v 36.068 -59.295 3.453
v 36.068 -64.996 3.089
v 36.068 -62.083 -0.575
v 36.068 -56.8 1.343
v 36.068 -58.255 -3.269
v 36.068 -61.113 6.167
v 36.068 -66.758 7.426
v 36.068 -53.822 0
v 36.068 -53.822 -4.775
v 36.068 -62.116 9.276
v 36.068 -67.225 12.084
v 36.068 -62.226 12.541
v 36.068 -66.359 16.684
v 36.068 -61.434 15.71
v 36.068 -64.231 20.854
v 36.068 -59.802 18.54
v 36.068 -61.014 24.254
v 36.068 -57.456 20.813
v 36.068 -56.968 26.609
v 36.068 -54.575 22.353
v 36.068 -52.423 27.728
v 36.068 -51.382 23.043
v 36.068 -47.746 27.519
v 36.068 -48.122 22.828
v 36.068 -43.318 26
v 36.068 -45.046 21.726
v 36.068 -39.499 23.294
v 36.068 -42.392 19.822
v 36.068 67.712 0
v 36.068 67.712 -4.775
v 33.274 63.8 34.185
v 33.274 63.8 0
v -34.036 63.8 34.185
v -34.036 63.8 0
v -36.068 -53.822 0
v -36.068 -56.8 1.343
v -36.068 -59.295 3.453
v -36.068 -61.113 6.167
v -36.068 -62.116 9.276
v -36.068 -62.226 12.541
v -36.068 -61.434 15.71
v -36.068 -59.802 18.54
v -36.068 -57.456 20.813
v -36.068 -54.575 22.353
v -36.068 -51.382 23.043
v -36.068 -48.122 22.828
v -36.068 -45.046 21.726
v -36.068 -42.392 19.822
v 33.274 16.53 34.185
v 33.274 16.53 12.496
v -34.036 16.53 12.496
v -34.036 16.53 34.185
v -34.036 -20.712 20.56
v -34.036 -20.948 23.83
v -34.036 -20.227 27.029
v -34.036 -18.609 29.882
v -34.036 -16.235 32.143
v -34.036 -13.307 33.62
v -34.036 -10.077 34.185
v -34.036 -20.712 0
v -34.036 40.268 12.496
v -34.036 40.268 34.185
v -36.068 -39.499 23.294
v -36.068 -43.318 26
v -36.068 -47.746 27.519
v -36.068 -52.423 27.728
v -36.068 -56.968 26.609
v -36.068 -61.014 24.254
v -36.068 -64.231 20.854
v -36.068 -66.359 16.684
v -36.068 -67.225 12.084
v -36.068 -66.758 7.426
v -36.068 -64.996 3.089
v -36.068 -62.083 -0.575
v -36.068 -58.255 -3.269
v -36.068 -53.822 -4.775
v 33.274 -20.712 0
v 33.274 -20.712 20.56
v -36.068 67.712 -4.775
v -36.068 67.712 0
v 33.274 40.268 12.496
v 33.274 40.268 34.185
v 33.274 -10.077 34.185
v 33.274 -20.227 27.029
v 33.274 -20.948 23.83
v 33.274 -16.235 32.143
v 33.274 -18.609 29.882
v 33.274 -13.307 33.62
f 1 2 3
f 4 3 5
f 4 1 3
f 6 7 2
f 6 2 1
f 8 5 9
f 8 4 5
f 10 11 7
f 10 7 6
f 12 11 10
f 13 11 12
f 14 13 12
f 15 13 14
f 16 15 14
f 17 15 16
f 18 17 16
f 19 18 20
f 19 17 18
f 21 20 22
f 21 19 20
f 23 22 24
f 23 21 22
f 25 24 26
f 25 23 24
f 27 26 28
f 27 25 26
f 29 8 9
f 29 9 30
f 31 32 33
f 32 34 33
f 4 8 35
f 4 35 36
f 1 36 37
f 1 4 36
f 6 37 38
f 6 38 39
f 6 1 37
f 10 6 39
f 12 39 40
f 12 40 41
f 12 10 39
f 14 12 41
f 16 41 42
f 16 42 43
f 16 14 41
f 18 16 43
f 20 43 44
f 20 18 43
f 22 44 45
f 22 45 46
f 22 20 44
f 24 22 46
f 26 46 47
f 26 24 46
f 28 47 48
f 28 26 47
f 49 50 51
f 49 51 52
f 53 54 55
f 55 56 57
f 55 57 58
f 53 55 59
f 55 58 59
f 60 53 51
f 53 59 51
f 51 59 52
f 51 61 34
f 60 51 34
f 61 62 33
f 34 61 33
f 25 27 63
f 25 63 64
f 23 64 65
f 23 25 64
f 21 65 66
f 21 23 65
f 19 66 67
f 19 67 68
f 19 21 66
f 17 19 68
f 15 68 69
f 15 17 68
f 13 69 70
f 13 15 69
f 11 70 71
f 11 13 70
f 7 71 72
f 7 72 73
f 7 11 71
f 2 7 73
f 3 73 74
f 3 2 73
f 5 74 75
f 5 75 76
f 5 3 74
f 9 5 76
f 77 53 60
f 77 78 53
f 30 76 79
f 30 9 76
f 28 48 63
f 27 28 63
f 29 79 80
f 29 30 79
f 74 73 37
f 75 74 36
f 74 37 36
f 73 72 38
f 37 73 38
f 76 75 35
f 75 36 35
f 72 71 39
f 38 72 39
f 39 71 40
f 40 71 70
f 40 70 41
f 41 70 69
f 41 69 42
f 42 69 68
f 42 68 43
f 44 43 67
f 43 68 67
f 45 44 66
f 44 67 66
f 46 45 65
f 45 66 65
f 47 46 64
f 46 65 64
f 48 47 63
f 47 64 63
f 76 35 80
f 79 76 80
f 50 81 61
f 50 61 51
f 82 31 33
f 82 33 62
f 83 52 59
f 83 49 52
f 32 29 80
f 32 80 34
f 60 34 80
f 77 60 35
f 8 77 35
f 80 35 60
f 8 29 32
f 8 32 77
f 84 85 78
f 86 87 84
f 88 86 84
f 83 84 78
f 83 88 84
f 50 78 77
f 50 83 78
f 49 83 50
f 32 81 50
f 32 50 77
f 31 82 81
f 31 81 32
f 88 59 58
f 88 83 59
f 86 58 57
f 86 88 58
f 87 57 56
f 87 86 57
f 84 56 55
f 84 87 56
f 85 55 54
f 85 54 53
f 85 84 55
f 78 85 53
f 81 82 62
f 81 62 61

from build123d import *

# Parameters (mm, degrees)
F1_DEPTH      = 36.068
F1_DEPTH_BACK = 36.068
F3_DEPTH      = 33.274
F3_DEPTH_BACK = 34.036


with BuildPart() as f1:
    # F0 (on Right) → F1 (new body, two sides)
    with BuildSketch(Plane.YZ) as f1_sk:
        with BuildLine():
            Line((67.711897, 0), (53.822275, 0))
            Line((53.822275, 0), (-53.822279, 0))
            ThreePointArc((-53.822279, 0), (-60.71707, 17.182161), (-42.39228, 19.821646))
            Line((-42.39228, 19.821646), (-39.498609, 23.294052))
            ThreePointArc((-39.498609, 23.294052), (-65.444359, 18.845353), (-53.822279, -4.774557))
            Line((-53.822279, -4.774557), (67.711897, -4.774557))
            Line((67.711897, -4.774557), (67.711897, 0))
        make_face()
    extrude(amount=F1_DEPTH)
    extrude(f1_sk.sketch, amount=-F1_DEPTH_BACK)

    # F2 (on Right) → F3 (join, two sides)
    with BuildSketch(Plane.YZ) as f3_sk:
        with BuildLine():
            Line((-20.712223, 20.559708), (-20.712223, 0))
            Line((-20.712223, 0), (63.800037, 0))
            Line((63.800037, 0), (63.800037, 34.184899))
            Line((63.800037, 34.184899), (40.267568, 34.184899))
            Line((40.267568, 34.184899), (40.267568, 12.495875))
            Line((40.267568, 12.495875), (16.530469, 12.495875))
            Line((16.530469, 12.495875), (16.530469, 34.184899))
            Line((16.530469, 34.184899), (-10.077052, 34.184899))
            ThreePointArc((-10.077052, 34.184899), (-18.609421, 29.881609), (-20.712223, 20.559708))
        make_face()
    extrude(amount=F3_DEPTH)
    extrude(f3_sk.sketch, amount=-F3_DEPTH_BACK)


solid = f1.part
